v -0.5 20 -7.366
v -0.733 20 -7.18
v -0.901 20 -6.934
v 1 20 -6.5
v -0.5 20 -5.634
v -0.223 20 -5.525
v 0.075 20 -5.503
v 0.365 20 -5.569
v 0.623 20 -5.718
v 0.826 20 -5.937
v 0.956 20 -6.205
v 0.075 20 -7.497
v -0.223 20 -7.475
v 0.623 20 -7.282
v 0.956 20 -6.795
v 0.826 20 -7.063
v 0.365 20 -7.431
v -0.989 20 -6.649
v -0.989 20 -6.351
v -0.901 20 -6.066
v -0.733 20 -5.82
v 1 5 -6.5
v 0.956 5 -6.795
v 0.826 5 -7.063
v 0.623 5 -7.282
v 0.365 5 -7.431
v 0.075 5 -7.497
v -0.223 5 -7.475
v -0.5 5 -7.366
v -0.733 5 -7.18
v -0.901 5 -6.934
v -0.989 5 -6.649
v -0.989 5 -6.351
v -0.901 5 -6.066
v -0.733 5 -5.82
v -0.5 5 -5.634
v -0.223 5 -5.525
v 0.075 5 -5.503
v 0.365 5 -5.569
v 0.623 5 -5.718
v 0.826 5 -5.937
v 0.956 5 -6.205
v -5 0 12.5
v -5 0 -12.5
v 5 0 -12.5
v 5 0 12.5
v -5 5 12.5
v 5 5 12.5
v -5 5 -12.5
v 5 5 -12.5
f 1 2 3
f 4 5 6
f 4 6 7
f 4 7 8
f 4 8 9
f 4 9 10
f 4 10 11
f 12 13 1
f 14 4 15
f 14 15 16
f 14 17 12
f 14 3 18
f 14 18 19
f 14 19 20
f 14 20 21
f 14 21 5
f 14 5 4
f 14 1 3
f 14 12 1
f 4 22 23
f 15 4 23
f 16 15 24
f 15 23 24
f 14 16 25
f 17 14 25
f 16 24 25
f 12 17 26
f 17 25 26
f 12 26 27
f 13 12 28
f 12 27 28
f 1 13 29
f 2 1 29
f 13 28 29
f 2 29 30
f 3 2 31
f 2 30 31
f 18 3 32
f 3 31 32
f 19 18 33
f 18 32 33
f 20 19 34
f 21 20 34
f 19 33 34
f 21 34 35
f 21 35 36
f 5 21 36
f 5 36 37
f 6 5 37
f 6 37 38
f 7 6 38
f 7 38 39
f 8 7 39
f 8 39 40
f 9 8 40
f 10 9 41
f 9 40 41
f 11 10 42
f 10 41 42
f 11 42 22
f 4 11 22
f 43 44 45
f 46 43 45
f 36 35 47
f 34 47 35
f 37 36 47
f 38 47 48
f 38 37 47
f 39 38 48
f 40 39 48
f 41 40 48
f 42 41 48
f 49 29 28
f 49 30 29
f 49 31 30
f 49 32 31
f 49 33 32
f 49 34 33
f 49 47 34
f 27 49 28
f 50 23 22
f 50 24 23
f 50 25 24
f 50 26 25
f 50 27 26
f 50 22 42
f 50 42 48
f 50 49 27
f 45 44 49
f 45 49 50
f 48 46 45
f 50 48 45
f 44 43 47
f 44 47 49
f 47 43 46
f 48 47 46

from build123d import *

# Parameters (mm, degrees)
CROQUIS1_W              = 10
CROQUIS1_H              = 25
SALIENTE_EXTRUIR1_DEPTH = 5
CROQUIS2_R              = 1
SALIENTE_EXTRUIR2_DEPTH = 15


with BuildPart() as part:
    # Croquis1 → Saliente-Extruir1 (new body)
    with BuildSketch(Plane(origin=(0, 0, 0), x_dir=(1, 0, 0), z_dir=(0, 1, 0))):
        Rectangle(CROQUIS1_W, CROQUIS1_H)
    extrude(amount=SALIENTE_EXTRUIR1_DEPTH)

    # Croquis2 → Saliente-Extruir2 (add)
    with BuildSketch(Plane(origin=(0, 5, 0), x_dir=(1, 0, 0), z_dir=(0, 1, 0))):
        with Locations((0, 6.5)):
            Circle(CROQUIS2_R)
    extrude(amount=SALIENTE_EXTRUIR2_DEPTH)


solid = part.part
